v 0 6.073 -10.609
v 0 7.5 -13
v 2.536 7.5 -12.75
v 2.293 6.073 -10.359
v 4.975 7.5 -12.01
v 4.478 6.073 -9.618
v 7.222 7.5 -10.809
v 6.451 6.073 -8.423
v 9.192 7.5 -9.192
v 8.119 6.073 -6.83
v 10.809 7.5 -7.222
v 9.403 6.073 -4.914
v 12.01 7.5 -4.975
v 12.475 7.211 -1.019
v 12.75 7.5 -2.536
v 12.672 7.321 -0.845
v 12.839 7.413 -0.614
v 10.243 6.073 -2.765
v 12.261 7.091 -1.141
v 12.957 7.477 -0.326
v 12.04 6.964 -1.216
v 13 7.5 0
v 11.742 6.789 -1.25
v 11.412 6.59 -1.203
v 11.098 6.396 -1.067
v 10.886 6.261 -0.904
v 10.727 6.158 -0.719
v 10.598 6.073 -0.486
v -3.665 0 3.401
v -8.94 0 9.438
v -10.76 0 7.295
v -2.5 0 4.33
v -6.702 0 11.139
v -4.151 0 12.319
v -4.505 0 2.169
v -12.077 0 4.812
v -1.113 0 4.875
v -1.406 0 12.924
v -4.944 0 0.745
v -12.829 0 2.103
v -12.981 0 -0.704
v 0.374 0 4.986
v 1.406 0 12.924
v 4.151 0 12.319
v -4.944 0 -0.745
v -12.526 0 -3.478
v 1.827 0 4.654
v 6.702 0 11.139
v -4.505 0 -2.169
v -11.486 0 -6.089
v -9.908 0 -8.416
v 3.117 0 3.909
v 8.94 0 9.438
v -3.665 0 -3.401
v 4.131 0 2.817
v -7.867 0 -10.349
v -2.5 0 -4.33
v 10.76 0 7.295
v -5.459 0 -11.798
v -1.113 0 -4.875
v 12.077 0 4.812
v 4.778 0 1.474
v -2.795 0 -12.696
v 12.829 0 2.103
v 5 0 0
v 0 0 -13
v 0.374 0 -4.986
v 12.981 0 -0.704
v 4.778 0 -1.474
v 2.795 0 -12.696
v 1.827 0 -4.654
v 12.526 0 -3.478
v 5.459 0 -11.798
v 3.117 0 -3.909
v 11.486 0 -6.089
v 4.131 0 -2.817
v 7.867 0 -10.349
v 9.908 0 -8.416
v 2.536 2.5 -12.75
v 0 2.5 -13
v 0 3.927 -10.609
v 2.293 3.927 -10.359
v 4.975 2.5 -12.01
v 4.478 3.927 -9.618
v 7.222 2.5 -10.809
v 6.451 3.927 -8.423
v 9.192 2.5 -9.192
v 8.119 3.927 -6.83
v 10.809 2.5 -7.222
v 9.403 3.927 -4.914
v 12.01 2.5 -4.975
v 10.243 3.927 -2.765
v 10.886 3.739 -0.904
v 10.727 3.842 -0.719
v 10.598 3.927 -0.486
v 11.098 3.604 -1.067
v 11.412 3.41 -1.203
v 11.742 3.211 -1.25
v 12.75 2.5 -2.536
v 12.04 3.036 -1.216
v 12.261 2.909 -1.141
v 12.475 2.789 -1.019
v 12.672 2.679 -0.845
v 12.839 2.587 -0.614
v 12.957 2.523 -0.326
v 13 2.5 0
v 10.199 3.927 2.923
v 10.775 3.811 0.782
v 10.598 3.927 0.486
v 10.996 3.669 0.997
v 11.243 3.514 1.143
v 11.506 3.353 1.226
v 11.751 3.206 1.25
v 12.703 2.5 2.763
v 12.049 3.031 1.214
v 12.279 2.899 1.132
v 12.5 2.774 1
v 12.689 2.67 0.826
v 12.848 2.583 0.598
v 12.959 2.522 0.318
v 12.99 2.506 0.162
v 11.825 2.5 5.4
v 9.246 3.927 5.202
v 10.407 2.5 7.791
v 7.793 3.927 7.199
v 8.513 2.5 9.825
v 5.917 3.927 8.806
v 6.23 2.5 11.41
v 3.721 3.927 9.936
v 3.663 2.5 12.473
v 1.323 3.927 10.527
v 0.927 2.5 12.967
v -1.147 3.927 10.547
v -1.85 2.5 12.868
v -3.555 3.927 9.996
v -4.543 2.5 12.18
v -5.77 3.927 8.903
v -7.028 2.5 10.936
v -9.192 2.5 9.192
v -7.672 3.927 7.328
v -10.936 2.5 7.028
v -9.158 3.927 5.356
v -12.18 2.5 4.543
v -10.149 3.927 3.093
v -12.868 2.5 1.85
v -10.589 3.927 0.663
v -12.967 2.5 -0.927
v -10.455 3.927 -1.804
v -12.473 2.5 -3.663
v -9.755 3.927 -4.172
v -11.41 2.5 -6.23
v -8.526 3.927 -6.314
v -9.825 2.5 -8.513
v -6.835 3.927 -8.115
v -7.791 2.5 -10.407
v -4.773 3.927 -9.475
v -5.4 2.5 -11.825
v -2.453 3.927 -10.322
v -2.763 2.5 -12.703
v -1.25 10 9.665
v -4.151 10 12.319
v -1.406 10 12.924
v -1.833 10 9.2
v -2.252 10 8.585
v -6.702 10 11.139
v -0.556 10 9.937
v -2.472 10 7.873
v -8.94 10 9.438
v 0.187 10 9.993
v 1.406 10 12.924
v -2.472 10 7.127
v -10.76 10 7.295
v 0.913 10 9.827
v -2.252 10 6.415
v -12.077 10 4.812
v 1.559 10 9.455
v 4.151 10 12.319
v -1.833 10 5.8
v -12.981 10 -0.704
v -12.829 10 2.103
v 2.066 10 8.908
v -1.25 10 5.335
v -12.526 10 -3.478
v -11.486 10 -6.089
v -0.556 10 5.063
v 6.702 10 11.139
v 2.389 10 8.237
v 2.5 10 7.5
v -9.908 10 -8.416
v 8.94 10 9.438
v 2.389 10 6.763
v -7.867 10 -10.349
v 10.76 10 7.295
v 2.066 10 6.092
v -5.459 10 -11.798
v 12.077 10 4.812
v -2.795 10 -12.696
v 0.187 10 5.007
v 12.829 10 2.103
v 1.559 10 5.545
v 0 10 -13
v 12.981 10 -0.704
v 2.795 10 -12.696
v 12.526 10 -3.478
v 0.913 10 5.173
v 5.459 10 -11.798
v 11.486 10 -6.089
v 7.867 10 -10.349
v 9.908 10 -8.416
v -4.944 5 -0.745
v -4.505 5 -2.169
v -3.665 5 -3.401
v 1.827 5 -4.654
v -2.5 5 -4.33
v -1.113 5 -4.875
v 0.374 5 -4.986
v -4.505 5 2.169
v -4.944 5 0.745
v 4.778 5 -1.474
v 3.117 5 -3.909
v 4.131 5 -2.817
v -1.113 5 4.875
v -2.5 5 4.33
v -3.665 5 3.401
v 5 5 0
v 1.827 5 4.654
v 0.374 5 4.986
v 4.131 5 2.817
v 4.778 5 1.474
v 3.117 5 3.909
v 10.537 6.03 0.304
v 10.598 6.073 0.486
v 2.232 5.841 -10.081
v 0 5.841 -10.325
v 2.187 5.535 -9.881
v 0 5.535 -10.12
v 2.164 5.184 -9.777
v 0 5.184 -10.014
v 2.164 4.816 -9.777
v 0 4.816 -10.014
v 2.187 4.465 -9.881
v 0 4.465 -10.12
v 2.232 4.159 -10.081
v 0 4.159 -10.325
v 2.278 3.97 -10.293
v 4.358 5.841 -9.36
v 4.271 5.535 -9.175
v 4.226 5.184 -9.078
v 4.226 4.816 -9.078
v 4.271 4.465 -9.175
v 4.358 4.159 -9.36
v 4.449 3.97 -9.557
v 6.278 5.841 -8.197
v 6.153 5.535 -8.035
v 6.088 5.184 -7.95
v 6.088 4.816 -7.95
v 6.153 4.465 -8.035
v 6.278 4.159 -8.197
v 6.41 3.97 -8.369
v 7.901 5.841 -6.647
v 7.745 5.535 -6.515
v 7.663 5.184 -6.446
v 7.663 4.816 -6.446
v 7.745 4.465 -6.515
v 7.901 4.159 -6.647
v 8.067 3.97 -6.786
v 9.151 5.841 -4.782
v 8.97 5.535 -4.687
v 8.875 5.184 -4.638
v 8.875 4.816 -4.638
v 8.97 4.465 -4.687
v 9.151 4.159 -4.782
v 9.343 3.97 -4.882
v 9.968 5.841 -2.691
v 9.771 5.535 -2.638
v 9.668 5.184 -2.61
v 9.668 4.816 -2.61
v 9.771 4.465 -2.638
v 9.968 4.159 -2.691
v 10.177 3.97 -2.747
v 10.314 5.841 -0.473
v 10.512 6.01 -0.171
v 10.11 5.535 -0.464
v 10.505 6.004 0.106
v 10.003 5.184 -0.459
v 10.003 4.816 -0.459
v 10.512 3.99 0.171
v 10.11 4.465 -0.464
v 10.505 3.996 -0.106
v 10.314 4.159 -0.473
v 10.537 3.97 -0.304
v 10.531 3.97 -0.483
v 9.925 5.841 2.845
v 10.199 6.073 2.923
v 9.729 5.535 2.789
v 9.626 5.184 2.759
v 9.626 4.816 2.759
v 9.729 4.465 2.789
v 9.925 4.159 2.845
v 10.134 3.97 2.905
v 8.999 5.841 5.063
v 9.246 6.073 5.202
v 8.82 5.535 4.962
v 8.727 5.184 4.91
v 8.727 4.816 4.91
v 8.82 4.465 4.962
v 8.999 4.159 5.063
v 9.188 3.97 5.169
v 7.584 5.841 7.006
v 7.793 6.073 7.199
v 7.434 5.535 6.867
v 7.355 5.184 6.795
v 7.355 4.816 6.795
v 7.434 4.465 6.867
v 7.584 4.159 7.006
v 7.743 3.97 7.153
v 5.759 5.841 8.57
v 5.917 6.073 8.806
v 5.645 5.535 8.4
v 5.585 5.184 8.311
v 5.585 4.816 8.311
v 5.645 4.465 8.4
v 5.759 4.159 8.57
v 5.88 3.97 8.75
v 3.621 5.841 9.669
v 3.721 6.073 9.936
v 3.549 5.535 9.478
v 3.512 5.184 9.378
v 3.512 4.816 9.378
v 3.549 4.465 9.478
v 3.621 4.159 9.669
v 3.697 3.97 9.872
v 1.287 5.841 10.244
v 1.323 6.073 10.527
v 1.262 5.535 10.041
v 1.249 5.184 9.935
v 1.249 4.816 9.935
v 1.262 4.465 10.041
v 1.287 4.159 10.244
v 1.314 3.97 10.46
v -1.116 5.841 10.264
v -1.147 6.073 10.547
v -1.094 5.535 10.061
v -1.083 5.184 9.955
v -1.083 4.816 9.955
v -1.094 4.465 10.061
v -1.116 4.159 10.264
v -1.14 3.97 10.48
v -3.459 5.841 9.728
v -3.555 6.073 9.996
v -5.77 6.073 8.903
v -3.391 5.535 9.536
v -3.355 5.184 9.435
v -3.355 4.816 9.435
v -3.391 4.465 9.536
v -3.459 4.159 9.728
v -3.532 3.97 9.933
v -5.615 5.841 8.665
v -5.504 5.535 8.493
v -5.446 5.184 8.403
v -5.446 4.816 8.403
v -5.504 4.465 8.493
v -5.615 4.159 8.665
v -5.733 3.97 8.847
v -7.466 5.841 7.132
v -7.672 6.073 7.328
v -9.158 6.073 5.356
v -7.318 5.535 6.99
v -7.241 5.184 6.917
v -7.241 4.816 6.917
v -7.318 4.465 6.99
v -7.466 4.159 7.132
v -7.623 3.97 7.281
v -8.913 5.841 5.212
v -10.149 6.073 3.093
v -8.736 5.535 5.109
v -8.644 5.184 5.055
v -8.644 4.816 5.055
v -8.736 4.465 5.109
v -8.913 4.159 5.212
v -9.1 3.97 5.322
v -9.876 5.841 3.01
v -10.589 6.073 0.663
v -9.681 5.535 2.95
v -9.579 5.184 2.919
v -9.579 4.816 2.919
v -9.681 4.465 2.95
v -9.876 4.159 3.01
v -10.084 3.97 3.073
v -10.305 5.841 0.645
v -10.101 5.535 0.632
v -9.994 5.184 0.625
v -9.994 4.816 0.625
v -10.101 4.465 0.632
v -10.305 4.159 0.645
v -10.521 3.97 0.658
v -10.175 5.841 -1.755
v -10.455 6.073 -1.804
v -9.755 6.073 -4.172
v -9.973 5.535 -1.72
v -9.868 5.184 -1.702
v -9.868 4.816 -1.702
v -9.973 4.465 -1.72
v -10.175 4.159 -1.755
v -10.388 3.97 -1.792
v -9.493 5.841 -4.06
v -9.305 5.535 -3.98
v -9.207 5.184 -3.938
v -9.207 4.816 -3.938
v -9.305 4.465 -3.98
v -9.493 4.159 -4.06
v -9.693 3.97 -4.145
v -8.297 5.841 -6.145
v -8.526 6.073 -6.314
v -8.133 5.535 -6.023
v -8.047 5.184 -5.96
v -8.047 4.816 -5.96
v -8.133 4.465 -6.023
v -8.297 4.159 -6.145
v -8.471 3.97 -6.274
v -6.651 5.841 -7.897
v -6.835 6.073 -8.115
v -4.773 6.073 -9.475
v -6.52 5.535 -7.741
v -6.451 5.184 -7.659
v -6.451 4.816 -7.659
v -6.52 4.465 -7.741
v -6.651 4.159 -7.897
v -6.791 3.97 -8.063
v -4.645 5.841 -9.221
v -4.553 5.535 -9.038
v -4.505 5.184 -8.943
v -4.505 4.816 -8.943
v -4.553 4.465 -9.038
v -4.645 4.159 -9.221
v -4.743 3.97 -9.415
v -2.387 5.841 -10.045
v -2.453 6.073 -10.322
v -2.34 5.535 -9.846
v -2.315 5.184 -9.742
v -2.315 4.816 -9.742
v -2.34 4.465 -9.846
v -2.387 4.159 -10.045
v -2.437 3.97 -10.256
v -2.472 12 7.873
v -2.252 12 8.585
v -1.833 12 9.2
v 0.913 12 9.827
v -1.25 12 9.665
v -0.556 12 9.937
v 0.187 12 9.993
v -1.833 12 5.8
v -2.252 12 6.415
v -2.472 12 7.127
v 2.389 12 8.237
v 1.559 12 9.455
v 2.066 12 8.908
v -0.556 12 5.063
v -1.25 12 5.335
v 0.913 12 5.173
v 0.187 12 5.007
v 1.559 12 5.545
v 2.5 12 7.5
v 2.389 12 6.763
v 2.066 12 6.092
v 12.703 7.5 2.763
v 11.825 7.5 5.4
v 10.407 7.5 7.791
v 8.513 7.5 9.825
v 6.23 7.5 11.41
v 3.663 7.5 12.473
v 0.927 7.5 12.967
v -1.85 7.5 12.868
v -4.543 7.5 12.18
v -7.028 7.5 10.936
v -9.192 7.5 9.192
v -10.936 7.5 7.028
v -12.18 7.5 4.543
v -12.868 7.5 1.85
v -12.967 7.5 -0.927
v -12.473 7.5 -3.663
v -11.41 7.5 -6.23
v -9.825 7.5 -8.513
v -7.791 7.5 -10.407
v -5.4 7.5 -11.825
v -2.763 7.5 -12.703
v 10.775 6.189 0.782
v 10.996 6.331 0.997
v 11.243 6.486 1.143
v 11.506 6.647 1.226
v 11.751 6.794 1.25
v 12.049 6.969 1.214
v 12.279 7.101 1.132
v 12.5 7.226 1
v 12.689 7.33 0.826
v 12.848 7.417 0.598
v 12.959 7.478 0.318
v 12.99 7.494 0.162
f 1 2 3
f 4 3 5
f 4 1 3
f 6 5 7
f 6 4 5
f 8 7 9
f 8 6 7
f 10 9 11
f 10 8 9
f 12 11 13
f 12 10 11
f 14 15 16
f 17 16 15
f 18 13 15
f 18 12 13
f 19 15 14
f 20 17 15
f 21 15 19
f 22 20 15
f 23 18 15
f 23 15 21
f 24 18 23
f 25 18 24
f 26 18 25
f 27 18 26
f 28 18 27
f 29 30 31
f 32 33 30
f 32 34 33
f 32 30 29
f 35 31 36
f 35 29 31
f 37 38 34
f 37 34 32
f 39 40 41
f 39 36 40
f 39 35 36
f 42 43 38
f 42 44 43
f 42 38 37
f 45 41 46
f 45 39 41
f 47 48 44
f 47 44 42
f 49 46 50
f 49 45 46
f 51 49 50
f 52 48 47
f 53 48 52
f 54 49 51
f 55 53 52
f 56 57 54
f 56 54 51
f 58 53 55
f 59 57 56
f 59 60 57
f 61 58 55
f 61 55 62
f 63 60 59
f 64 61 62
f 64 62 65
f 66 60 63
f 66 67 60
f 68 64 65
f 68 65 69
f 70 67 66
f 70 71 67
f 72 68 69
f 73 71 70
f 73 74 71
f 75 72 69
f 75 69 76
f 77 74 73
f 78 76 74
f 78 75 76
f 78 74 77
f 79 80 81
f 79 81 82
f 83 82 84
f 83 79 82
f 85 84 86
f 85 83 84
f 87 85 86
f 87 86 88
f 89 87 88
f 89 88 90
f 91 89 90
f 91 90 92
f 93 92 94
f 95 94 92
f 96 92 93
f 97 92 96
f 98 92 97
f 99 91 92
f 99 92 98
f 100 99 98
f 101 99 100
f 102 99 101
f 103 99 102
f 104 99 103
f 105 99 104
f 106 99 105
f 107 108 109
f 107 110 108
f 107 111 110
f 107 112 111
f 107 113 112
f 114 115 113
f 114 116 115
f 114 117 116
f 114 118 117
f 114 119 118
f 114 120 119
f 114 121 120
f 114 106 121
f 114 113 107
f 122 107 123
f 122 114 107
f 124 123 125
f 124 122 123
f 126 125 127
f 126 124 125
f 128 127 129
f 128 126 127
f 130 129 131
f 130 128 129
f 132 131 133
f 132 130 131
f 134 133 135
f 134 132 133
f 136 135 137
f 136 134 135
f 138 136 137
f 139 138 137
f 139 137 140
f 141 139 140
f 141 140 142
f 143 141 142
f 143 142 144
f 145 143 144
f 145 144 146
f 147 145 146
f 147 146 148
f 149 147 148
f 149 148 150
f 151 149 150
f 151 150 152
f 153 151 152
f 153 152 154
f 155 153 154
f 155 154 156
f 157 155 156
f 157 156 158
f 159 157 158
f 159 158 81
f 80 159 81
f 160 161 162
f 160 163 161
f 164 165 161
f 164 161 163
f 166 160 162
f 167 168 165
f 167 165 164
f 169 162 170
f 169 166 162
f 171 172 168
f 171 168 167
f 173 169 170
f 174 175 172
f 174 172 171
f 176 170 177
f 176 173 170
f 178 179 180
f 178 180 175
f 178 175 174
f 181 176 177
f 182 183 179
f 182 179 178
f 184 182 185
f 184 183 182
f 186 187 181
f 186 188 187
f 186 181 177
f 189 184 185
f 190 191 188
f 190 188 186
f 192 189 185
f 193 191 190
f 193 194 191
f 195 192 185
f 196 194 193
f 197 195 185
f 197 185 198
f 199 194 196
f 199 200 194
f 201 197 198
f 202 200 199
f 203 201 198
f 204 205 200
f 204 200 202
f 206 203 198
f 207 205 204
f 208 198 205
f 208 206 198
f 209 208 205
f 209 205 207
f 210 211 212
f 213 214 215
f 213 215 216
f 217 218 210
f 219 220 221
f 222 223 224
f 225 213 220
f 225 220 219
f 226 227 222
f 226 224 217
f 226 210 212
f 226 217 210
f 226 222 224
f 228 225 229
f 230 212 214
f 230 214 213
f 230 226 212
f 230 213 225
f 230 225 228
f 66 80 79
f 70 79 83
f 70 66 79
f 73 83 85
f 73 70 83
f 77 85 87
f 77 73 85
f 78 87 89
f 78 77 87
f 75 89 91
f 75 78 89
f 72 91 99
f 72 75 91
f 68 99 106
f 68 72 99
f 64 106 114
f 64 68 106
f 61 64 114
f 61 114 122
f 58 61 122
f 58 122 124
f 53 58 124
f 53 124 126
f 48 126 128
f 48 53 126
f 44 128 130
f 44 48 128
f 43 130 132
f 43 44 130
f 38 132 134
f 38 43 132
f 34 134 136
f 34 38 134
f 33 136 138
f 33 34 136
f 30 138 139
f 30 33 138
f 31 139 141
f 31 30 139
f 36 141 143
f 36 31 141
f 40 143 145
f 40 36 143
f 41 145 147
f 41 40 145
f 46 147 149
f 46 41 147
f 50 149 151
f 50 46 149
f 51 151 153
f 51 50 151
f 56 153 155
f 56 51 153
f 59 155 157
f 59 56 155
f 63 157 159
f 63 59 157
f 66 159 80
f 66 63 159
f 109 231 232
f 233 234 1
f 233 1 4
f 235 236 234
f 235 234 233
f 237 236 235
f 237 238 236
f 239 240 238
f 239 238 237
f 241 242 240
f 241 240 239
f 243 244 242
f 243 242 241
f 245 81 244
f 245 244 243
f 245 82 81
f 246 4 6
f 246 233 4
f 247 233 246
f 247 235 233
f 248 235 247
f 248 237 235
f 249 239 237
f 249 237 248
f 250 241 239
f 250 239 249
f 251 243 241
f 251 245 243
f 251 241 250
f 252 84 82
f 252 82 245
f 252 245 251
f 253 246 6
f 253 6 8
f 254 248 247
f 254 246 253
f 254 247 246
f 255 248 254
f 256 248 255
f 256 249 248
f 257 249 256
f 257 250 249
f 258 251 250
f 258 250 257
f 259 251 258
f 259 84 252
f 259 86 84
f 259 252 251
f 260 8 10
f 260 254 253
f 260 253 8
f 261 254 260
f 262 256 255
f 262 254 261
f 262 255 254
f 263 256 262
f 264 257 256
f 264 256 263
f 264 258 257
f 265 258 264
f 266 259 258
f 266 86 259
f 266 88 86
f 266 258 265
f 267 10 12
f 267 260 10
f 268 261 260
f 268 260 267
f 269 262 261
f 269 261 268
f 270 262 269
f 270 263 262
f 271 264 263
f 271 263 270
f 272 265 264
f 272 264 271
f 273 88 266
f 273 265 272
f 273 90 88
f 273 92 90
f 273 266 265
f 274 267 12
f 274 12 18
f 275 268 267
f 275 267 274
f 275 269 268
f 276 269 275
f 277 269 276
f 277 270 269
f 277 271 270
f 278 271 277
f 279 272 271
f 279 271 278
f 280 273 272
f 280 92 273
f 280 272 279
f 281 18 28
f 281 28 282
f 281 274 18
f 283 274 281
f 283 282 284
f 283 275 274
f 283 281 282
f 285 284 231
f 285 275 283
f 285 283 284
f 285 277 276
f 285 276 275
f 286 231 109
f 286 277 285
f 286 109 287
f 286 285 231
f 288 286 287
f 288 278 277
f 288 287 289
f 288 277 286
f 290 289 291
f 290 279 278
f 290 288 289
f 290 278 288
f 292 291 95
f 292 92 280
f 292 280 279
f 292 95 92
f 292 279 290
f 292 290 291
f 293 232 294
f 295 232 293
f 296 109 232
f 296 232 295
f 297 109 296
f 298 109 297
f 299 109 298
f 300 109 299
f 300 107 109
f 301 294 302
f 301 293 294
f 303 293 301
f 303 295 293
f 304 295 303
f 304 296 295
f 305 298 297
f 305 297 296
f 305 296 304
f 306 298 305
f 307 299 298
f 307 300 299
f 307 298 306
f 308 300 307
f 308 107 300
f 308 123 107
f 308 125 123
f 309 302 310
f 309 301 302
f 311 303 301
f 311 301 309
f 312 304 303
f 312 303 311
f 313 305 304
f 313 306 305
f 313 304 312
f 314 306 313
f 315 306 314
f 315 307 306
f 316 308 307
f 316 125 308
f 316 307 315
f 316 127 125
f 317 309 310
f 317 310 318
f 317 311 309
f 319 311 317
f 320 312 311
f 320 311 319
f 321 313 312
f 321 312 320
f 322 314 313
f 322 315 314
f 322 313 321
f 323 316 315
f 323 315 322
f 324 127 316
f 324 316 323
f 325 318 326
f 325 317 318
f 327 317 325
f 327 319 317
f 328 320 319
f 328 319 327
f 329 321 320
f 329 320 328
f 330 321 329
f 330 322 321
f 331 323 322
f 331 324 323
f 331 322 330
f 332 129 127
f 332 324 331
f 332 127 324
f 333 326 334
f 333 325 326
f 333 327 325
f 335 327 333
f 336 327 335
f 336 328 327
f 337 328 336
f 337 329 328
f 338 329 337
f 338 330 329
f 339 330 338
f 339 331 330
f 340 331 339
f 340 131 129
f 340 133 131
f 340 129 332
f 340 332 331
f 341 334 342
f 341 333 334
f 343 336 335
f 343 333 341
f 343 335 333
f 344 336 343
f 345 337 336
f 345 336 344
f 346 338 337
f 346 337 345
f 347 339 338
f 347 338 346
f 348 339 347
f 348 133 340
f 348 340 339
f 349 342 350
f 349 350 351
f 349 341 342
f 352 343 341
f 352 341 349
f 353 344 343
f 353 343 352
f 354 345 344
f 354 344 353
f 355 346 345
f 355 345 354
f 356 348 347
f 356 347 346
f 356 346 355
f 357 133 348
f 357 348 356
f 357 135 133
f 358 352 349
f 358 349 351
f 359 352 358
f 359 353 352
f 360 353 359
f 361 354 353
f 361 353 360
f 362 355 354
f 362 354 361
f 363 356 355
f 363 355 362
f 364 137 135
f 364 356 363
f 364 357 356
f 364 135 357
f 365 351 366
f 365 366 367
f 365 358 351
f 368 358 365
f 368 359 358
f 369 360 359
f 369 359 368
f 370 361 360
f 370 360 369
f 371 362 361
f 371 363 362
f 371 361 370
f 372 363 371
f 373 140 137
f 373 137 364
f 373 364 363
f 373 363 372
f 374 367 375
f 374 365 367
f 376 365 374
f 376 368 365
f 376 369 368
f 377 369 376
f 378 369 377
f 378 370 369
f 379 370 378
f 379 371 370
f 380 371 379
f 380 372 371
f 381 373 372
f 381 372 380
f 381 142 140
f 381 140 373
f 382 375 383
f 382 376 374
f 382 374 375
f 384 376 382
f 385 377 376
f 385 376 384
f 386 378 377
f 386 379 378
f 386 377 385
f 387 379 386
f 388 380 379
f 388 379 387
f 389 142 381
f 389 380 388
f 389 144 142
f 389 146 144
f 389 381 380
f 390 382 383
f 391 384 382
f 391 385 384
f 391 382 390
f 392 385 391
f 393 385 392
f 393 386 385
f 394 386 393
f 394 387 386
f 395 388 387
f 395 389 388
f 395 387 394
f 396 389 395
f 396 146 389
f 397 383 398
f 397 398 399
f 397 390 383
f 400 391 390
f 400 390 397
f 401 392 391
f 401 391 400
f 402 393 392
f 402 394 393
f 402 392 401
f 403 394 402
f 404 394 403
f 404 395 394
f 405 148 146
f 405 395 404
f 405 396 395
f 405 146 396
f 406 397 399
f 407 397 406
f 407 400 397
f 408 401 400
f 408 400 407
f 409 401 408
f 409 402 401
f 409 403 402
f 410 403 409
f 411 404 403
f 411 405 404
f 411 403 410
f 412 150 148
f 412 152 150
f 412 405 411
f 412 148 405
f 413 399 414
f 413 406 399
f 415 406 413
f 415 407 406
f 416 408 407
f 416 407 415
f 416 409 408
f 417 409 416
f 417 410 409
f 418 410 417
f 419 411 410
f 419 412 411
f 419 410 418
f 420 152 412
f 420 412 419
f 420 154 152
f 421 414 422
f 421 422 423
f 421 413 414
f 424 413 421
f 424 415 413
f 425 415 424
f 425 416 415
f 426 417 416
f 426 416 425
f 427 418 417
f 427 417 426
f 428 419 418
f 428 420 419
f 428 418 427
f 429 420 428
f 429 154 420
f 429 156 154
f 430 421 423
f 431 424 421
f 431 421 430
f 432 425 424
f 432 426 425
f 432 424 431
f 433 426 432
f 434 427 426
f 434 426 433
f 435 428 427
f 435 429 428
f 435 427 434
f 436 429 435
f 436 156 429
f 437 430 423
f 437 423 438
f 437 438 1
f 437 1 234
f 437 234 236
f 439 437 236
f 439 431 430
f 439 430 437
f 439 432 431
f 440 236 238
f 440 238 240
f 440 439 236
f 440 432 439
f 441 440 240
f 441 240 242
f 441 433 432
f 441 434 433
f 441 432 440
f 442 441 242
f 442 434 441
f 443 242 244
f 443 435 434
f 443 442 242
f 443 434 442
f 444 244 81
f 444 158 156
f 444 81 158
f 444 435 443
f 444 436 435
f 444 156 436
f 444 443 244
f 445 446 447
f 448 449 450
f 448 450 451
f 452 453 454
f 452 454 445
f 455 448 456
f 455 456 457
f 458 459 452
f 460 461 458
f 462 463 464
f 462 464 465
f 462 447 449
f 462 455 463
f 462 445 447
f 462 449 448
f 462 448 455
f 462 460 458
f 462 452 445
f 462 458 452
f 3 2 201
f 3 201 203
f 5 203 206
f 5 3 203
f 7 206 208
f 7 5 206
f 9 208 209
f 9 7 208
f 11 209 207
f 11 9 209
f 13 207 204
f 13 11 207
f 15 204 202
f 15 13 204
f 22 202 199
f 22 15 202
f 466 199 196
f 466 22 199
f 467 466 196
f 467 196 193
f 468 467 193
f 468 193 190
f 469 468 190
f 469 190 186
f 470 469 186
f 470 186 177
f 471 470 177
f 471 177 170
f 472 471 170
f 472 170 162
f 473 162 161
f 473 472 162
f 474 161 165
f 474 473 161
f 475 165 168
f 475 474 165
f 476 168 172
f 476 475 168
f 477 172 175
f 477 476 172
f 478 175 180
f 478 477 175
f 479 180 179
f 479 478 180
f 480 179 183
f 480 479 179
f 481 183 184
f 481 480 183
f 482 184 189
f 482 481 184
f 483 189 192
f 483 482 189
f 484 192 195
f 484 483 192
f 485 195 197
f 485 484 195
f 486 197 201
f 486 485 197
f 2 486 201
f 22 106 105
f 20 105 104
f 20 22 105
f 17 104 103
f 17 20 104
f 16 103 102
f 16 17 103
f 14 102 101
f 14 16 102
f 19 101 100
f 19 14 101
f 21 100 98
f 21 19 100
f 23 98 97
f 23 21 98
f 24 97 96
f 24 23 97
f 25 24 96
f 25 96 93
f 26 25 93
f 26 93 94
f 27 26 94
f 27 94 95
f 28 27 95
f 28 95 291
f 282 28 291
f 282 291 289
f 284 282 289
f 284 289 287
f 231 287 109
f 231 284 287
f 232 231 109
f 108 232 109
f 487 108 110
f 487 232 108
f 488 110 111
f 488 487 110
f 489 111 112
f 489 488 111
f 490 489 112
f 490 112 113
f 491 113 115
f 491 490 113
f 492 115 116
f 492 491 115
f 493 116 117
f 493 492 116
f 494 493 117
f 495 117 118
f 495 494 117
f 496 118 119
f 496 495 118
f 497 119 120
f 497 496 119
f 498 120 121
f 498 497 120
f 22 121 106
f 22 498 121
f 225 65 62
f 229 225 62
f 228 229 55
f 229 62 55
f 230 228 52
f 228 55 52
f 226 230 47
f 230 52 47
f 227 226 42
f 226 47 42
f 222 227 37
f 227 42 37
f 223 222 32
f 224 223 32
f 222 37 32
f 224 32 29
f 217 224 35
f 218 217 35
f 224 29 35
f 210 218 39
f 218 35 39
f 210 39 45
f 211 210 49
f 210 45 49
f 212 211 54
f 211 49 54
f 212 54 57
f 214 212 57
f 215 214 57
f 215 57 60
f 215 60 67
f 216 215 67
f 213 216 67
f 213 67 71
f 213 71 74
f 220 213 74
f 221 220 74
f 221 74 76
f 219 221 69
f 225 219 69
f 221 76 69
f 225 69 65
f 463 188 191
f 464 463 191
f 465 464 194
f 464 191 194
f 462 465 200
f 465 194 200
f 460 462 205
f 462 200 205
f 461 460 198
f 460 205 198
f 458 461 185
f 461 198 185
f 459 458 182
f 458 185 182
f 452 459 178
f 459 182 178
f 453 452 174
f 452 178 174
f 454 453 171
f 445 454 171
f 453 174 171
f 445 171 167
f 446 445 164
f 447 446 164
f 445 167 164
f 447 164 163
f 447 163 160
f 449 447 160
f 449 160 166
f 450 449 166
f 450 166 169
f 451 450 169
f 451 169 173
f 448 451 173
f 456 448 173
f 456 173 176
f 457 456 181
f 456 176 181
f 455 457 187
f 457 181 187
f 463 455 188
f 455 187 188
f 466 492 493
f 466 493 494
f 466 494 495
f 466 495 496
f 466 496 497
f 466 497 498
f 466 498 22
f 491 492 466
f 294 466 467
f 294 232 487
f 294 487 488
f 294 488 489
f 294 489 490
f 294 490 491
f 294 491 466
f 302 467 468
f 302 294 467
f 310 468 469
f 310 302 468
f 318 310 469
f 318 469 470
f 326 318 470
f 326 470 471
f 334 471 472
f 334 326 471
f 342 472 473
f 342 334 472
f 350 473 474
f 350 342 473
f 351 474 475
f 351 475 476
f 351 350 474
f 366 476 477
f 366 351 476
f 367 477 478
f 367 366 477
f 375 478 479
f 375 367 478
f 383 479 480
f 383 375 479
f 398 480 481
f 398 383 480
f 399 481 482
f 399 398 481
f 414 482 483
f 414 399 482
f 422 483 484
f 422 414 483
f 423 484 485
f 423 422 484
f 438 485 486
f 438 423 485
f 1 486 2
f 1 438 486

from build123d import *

# Parameters (mm, degrees)
SKETCH1_R           = 10
BOSS_EXTRUDE1_DEPTH = 10
SKETCH3_R           = 5
CUT_EXTRUDE1_DEPTH  = 5
SKETCH4_R           = 2.5
BOSS_EXTRUDE2_DEPTH = 2
SKETCH5_R           = 1.25
BOSS_EXTRUDE3_DEPTH = 10


with BuildPart() as part:
    # Sketch1 → Boss-Extrude1 (new body)
    with BuildSketch(Plane(origin=(0, 0, 0), x_dir=(1, 0, 0), z_dir=(0, 1, 0))):
        Circle(SKETCH1_R)
    extrude(amount=BOSS_EXTRUDE1_DEPTH)

    # Sketch2 → Revolve1 (revolve)
    with BuildSketch(Plane(origin=(0, 0, 0), x_dir=(0, 0, -1), z_dir=(1, 0, 0))):
        with BuildLine():
            Line((10, 10), (13, 10))
            Line((13, 10), (13, 7.5))
            Line((13, 7.5), (10.60943551, 6.073395143))
            ThreePointArc((10.60943551, 6.073395143), (10, 5), (10.60943551, 3.926604857))
            Line((10.60943551, 3.926604857), (13, 2.5))
            Line((13, 2.5), (13, 0))
            Line((13, 0), (10, 0))
            Line((10, 0), (9.25, 0))
            Line((9.25, 0), (9.25, 10))
            Line((9.25, 10), (10, 10))
        make_face()
    revolve(axis=Axis((0, 10, 0), (0, -1, 0)))

    # Sketch3 → Cut-Extrude1 (cut)
    with BuildSketch(Plane.XZ):
        Circle(SKETCH3_R)
    extrude(amount=-CUT_EXTRUDE1_DEPTH, mode=Mode.SUBTRACT)

    # Sketch4 → Boss-Extrude2 (add)
    with BuildSketch(Plane(origin=(0, 10, 0), x_dir=(1, 0, 0), z_dir=(0, 1, 0))):
        with Locations((0, -7.5)):
            Circle(SKETCH4_R)
    extrude(amount=BOSS_EXTRUDE2_DEPTH)

    # Sketch5 → Boss-Extrude3 (add)
    with BuildSketch(Plane(origin=(0, 10, 0), x_dir=(1, 0, 0), z_dir=(0, 1, 0))):
        with Locations((11.75, 0)):
            Circle(SKETCH5_R)
    extrude(amount=-BOSS_EXTRUDE3_DEPTH)


solid = part.part
